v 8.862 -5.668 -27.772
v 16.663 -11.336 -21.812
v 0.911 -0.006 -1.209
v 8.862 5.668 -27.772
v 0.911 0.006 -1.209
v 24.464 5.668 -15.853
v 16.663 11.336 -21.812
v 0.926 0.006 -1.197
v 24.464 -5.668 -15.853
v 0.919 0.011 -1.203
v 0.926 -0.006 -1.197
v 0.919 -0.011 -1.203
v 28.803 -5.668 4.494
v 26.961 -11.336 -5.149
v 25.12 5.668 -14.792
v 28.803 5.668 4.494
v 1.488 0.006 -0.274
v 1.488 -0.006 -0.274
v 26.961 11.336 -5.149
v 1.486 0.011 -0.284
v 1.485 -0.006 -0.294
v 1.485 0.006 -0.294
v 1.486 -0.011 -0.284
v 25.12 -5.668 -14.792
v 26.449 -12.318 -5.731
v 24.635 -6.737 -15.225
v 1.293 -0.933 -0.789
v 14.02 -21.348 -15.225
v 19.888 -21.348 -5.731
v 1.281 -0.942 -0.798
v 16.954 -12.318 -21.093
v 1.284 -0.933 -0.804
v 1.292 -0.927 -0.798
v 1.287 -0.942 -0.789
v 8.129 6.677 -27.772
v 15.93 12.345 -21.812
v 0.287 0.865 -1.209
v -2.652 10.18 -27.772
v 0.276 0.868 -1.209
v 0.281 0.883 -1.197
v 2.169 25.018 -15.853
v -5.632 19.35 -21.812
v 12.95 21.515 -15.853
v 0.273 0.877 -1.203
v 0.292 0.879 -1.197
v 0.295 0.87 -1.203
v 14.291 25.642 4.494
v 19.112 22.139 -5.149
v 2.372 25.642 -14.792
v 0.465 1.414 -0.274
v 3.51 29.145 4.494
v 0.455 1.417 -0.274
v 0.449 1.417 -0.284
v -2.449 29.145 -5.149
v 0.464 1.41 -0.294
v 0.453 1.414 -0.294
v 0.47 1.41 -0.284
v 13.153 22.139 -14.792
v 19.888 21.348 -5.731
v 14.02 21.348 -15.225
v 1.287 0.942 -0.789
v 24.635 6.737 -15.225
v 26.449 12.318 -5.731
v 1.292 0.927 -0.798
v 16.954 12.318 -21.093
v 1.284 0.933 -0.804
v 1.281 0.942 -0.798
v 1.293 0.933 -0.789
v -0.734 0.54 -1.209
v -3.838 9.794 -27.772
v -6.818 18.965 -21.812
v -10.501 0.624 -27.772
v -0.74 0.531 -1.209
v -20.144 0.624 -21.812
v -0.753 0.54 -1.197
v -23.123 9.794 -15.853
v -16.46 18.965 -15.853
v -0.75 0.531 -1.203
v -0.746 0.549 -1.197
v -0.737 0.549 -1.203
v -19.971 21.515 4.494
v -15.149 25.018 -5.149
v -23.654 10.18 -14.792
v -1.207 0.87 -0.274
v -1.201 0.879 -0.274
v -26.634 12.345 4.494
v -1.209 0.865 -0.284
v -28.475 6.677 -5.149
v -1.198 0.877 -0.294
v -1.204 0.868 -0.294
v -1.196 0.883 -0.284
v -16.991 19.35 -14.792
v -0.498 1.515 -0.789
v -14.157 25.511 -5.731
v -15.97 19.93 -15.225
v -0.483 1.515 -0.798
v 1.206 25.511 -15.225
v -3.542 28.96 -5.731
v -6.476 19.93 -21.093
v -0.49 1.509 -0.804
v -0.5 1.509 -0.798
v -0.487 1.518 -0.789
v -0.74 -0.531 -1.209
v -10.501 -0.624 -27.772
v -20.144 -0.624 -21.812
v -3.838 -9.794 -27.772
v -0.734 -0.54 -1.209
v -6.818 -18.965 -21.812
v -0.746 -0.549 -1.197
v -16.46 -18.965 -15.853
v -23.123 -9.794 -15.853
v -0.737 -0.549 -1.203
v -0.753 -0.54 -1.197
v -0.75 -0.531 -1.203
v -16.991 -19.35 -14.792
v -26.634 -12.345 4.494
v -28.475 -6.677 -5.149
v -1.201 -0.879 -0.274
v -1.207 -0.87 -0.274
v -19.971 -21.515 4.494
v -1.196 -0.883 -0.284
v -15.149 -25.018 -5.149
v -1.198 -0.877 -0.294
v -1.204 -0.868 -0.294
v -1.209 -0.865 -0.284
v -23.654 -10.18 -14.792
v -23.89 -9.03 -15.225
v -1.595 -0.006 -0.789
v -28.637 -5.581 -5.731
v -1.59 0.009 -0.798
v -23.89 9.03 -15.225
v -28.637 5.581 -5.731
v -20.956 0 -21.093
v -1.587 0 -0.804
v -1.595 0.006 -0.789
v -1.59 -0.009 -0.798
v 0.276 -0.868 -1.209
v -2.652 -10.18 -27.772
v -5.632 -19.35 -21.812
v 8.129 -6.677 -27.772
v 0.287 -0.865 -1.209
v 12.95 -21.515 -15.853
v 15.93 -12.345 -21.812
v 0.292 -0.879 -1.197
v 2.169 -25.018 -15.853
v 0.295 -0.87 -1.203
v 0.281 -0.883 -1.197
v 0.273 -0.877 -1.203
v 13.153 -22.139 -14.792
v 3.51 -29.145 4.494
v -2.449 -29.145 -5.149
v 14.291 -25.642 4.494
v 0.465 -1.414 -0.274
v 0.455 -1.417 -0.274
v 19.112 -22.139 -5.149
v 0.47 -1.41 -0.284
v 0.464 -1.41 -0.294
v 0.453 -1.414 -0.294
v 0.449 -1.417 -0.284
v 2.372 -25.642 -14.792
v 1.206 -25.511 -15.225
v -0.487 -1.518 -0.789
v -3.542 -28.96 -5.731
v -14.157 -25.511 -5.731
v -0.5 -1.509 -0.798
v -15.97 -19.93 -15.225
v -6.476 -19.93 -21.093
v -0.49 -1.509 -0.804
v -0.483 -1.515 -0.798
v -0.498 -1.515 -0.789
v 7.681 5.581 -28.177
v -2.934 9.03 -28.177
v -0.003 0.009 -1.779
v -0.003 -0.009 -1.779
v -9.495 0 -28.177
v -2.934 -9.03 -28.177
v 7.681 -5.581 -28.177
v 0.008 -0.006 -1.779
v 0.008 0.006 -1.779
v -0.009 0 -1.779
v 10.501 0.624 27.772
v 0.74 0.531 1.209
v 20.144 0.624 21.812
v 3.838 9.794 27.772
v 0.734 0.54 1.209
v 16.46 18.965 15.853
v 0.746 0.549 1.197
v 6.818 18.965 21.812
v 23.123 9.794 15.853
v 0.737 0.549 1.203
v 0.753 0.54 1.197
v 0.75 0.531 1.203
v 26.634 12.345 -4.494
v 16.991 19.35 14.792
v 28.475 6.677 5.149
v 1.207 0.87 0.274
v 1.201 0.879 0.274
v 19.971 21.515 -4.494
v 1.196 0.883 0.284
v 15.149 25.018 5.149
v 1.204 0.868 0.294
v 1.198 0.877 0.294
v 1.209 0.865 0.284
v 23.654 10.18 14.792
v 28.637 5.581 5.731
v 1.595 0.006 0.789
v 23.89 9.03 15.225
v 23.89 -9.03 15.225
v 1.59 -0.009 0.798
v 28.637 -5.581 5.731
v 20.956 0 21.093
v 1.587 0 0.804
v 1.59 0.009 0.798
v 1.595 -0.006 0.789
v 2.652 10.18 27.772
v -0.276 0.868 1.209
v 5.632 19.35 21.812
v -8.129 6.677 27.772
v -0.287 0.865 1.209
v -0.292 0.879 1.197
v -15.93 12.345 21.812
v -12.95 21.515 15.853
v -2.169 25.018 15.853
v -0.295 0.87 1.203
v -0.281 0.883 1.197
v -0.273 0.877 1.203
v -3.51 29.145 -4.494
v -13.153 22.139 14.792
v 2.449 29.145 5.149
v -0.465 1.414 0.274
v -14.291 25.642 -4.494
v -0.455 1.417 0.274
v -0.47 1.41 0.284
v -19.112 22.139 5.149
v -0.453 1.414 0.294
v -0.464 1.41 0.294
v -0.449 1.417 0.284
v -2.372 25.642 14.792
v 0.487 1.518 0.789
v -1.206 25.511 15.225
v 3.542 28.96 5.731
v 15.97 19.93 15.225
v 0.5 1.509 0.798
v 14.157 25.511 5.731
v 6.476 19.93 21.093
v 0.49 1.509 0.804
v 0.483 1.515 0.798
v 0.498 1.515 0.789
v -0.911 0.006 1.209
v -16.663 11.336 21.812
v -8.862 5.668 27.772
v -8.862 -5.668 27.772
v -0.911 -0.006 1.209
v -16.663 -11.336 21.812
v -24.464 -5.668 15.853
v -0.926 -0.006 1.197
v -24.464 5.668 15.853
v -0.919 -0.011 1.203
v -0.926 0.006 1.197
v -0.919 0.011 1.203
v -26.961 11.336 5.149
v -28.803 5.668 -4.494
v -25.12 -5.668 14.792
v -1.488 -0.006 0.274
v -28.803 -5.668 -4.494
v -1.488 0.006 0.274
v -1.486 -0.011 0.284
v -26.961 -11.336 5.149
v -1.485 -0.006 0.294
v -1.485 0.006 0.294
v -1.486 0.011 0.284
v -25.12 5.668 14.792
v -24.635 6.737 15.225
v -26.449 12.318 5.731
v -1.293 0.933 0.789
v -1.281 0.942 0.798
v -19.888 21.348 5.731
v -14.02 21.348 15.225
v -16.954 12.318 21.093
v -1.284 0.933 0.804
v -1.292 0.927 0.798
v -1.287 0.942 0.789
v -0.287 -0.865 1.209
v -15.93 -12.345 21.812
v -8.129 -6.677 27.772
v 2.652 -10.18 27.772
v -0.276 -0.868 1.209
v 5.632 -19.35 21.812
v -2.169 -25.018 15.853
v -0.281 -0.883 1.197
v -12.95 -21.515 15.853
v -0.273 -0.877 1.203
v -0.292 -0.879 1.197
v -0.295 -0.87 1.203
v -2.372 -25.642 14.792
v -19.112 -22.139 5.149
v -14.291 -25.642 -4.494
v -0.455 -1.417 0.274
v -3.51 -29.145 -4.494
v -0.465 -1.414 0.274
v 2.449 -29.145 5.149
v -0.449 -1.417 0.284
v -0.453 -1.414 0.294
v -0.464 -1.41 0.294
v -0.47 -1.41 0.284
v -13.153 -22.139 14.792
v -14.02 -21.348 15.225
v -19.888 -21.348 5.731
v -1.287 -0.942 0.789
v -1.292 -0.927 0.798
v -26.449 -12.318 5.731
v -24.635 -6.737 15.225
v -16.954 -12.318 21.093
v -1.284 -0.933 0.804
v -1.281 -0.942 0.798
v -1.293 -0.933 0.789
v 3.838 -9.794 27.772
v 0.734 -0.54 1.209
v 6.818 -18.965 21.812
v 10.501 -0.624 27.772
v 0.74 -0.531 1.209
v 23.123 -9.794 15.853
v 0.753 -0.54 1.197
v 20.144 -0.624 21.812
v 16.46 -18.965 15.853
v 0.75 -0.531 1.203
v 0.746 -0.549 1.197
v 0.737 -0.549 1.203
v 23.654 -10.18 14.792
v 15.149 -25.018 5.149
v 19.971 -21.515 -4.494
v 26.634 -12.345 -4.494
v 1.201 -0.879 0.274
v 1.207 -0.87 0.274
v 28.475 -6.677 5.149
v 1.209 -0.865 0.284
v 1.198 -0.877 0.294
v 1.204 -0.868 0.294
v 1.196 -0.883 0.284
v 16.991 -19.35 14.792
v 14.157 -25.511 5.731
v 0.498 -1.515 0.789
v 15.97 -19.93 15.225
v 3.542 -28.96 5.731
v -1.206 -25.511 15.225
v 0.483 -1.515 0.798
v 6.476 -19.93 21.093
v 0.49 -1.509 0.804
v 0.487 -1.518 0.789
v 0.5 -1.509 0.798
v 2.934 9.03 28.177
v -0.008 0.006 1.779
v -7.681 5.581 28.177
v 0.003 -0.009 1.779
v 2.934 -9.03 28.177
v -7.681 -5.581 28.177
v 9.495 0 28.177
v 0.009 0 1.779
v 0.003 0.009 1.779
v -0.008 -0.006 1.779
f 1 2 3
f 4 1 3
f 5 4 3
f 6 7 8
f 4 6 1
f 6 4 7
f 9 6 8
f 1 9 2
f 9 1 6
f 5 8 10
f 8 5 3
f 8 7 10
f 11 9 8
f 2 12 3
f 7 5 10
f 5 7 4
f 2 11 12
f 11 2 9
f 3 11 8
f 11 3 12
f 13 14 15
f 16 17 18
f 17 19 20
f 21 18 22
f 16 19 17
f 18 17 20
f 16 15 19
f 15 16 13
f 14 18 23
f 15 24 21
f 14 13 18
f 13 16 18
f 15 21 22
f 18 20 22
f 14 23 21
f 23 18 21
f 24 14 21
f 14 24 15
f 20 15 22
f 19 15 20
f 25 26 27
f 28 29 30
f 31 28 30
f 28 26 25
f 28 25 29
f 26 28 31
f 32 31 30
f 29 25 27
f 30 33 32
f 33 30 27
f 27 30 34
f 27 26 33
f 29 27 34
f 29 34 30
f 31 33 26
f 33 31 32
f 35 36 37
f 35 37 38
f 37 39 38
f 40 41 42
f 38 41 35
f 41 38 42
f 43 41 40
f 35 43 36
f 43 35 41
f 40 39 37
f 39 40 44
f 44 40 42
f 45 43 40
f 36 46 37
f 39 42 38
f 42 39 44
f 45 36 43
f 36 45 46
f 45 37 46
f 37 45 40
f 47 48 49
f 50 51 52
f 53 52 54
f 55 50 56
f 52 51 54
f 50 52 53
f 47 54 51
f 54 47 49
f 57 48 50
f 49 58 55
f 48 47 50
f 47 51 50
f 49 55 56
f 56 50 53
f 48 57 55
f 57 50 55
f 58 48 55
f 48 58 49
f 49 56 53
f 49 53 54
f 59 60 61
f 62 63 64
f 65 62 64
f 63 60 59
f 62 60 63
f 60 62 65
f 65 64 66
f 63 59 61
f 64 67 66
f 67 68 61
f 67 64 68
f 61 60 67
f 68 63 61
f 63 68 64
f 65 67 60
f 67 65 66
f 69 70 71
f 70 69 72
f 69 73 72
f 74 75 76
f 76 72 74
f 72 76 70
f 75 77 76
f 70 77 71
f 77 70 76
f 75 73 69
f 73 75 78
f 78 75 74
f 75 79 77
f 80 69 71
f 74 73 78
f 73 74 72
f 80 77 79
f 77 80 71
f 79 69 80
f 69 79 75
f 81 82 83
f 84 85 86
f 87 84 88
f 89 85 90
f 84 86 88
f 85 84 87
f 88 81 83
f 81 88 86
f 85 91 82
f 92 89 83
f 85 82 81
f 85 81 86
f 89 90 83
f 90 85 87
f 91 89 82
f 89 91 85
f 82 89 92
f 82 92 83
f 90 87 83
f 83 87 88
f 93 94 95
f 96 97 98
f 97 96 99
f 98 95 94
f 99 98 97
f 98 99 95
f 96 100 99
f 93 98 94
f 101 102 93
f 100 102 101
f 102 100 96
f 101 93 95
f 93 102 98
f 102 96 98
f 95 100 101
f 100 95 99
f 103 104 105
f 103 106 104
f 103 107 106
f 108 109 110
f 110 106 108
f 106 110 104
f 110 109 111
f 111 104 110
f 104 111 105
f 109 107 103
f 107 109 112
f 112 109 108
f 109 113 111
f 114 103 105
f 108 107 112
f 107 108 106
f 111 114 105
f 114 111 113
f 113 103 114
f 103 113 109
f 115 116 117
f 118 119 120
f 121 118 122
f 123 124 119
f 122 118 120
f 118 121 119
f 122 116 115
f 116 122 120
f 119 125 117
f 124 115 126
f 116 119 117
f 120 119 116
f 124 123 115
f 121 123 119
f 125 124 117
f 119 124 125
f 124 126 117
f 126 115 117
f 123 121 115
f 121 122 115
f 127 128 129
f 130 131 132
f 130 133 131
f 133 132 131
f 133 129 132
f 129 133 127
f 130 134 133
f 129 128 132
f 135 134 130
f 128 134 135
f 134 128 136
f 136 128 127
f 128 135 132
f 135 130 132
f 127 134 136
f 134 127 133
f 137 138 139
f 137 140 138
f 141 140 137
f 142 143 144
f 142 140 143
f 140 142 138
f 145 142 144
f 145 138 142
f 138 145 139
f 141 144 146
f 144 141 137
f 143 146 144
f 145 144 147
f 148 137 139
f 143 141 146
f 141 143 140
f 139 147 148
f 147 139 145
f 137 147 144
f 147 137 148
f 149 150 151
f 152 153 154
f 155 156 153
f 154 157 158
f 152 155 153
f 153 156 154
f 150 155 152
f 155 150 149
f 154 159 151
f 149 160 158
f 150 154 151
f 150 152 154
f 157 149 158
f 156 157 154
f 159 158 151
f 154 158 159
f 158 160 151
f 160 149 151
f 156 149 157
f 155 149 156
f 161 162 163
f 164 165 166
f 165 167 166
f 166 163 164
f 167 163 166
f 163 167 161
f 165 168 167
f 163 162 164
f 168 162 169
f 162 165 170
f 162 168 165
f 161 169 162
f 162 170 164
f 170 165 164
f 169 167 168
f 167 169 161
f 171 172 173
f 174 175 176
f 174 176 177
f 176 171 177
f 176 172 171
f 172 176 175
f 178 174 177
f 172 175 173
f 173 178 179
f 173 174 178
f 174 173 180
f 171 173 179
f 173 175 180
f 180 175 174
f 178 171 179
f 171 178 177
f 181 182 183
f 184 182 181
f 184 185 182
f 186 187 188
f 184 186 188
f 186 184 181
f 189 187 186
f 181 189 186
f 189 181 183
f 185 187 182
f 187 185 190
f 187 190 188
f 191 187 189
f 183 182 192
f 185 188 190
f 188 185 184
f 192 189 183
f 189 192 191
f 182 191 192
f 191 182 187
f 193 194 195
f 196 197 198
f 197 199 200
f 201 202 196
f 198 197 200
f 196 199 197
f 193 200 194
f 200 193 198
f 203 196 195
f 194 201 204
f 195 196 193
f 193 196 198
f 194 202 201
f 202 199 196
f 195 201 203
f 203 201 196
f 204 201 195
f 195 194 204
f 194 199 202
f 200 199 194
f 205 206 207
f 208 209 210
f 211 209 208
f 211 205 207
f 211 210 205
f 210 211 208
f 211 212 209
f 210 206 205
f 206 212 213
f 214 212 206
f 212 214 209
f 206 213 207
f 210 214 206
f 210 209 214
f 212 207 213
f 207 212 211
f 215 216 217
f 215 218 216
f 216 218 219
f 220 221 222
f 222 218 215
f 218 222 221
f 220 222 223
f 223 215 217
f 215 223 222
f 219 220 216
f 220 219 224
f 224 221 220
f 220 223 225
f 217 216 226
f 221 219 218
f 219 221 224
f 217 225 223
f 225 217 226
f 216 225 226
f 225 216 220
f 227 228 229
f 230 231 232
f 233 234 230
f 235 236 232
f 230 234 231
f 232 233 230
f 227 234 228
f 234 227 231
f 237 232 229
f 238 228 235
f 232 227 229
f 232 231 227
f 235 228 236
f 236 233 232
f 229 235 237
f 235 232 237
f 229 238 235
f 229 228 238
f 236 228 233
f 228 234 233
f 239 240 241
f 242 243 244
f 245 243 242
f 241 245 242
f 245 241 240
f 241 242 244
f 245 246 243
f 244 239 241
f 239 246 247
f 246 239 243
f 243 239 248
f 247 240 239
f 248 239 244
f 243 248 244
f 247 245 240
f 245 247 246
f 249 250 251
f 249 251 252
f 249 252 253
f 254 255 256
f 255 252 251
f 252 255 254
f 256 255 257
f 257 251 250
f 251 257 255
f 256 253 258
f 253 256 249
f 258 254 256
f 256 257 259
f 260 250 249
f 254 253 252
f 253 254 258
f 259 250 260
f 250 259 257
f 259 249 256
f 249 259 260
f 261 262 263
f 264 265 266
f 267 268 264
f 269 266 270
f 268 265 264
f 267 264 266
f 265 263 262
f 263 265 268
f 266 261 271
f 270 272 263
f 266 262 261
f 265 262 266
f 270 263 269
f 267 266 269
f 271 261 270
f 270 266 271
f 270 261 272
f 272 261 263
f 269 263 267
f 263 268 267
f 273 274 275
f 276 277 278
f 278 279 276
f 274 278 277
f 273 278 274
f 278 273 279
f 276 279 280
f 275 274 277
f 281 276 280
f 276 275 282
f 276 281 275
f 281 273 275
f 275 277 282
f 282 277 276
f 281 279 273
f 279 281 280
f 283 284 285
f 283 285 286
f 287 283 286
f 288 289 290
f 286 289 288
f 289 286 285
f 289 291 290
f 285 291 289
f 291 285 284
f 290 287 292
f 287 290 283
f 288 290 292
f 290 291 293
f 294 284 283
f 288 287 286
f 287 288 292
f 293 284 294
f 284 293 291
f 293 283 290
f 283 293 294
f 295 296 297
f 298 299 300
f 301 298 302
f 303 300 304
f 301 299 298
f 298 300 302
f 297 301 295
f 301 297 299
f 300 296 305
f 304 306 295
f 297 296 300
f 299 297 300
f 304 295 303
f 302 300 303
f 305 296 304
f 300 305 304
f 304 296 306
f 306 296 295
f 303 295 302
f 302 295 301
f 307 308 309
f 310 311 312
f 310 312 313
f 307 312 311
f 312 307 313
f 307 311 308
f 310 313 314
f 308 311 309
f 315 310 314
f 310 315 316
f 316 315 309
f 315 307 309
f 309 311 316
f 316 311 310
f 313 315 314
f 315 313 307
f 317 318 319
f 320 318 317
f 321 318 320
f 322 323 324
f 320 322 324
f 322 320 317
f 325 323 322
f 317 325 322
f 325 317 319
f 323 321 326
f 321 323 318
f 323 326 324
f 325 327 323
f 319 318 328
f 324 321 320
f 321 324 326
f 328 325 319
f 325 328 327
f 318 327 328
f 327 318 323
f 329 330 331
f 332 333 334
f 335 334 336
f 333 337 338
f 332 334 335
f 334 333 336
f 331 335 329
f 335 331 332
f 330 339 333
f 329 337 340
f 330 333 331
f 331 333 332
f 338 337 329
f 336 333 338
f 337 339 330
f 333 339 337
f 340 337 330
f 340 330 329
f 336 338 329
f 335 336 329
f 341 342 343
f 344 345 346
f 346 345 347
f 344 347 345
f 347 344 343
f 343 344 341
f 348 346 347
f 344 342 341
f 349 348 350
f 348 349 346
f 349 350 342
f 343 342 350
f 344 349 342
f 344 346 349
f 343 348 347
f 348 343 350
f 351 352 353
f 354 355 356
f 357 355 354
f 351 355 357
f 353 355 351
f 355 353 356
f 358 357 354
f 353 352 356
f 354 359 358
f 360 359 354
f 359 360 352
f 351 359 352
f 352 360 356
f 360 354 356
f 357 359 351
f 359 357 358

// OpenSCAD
module soccer_polyhedron(circumradius, spacing, jigsaw_base = false, half = false) {
    tau = 1.618034;
    a = -37.377368;
    scale_f = 0.201774;
    
    s = scale_f * spacing / 2;
    
    module pentagonal_pyramid() {
        pentagon_r = 1.701302;
        pentagon_h = 4.654877;
        
        convex_r = pentagon_r / 5 - s / 2;

        r_off = s / 0.759856;
        h_off = s / 0.343279;

        color("black")
        translate([0, 0, -pentagon_h])
        linear_extrude(pentagon_h - h_off, scale = 0.001) 
        rotate(-36) {
            circle(pentagon_r - r_off, $fn = 5);
            if(jigsaw_base) {
                for(i = [0:4]) {
                    rotate(36 + i * 72)
                    translate([pentagon_r - r_off - convex_r / 2, 0, 0]) 
                        circle(convex_r, $fn = 36);
                }
            }
        }
    }
    
    module hexagonal_pyramid() {
        hexagon_r = 2;
        hexagon_h = 4.534568;
        pentagon_r = 1.701302;
        concave_r = pentagon_r / 5 + s / 2;

        r_off = s / 0.792377;
        h_off = s /  0.403548;

        color("white")
        translate([0, 0, -hexagon_h])
        linear_extrude(hexagon_h - h_off, scale = 0.001) 
        rotate(-30) {
            difference() {
                circle(hexagon_r - r_off, $fn = 6); 
                if(jigsaw_base) {
                    for(i = [0:2]) {
                        rotate(90 + i * 120)
                        translate([hexagon_r - r_off - concave_r, 0, 0]) 
                            circle(concave_r, $fn = 36);
                    }   
                }   
            }
        }
    }

    module one_component_around_pentagonal_pyramid() {
        mirror([1, 0, 0]) 
        rotate([0, -a, 60]) {
            pentagonal_pyramid();
            for(i = [0:1]) {
                rotate([0, a, 72 * i])
                    hexagonal_pyramid(); 
            }    
        }    
    }
    
    module half_soccer_polyhedron() {
        pentagonal_pyramid();
        for(i = [0:4]) {
            rotate([0, a, 72 * i])
                one_component_around_pentagonal_pyramid(); 
        }       
    }

    scale(scale_f * circumradius) {
        half_soccer_polyhedron();
        if(!half) {
            rotate(36)
            mirror([0, 0, 1])
                half_soccer_polyhedron();    
        }
    }
}

soccer_polyhedron(30, 1);
%sphere(30, $fn = 48);
